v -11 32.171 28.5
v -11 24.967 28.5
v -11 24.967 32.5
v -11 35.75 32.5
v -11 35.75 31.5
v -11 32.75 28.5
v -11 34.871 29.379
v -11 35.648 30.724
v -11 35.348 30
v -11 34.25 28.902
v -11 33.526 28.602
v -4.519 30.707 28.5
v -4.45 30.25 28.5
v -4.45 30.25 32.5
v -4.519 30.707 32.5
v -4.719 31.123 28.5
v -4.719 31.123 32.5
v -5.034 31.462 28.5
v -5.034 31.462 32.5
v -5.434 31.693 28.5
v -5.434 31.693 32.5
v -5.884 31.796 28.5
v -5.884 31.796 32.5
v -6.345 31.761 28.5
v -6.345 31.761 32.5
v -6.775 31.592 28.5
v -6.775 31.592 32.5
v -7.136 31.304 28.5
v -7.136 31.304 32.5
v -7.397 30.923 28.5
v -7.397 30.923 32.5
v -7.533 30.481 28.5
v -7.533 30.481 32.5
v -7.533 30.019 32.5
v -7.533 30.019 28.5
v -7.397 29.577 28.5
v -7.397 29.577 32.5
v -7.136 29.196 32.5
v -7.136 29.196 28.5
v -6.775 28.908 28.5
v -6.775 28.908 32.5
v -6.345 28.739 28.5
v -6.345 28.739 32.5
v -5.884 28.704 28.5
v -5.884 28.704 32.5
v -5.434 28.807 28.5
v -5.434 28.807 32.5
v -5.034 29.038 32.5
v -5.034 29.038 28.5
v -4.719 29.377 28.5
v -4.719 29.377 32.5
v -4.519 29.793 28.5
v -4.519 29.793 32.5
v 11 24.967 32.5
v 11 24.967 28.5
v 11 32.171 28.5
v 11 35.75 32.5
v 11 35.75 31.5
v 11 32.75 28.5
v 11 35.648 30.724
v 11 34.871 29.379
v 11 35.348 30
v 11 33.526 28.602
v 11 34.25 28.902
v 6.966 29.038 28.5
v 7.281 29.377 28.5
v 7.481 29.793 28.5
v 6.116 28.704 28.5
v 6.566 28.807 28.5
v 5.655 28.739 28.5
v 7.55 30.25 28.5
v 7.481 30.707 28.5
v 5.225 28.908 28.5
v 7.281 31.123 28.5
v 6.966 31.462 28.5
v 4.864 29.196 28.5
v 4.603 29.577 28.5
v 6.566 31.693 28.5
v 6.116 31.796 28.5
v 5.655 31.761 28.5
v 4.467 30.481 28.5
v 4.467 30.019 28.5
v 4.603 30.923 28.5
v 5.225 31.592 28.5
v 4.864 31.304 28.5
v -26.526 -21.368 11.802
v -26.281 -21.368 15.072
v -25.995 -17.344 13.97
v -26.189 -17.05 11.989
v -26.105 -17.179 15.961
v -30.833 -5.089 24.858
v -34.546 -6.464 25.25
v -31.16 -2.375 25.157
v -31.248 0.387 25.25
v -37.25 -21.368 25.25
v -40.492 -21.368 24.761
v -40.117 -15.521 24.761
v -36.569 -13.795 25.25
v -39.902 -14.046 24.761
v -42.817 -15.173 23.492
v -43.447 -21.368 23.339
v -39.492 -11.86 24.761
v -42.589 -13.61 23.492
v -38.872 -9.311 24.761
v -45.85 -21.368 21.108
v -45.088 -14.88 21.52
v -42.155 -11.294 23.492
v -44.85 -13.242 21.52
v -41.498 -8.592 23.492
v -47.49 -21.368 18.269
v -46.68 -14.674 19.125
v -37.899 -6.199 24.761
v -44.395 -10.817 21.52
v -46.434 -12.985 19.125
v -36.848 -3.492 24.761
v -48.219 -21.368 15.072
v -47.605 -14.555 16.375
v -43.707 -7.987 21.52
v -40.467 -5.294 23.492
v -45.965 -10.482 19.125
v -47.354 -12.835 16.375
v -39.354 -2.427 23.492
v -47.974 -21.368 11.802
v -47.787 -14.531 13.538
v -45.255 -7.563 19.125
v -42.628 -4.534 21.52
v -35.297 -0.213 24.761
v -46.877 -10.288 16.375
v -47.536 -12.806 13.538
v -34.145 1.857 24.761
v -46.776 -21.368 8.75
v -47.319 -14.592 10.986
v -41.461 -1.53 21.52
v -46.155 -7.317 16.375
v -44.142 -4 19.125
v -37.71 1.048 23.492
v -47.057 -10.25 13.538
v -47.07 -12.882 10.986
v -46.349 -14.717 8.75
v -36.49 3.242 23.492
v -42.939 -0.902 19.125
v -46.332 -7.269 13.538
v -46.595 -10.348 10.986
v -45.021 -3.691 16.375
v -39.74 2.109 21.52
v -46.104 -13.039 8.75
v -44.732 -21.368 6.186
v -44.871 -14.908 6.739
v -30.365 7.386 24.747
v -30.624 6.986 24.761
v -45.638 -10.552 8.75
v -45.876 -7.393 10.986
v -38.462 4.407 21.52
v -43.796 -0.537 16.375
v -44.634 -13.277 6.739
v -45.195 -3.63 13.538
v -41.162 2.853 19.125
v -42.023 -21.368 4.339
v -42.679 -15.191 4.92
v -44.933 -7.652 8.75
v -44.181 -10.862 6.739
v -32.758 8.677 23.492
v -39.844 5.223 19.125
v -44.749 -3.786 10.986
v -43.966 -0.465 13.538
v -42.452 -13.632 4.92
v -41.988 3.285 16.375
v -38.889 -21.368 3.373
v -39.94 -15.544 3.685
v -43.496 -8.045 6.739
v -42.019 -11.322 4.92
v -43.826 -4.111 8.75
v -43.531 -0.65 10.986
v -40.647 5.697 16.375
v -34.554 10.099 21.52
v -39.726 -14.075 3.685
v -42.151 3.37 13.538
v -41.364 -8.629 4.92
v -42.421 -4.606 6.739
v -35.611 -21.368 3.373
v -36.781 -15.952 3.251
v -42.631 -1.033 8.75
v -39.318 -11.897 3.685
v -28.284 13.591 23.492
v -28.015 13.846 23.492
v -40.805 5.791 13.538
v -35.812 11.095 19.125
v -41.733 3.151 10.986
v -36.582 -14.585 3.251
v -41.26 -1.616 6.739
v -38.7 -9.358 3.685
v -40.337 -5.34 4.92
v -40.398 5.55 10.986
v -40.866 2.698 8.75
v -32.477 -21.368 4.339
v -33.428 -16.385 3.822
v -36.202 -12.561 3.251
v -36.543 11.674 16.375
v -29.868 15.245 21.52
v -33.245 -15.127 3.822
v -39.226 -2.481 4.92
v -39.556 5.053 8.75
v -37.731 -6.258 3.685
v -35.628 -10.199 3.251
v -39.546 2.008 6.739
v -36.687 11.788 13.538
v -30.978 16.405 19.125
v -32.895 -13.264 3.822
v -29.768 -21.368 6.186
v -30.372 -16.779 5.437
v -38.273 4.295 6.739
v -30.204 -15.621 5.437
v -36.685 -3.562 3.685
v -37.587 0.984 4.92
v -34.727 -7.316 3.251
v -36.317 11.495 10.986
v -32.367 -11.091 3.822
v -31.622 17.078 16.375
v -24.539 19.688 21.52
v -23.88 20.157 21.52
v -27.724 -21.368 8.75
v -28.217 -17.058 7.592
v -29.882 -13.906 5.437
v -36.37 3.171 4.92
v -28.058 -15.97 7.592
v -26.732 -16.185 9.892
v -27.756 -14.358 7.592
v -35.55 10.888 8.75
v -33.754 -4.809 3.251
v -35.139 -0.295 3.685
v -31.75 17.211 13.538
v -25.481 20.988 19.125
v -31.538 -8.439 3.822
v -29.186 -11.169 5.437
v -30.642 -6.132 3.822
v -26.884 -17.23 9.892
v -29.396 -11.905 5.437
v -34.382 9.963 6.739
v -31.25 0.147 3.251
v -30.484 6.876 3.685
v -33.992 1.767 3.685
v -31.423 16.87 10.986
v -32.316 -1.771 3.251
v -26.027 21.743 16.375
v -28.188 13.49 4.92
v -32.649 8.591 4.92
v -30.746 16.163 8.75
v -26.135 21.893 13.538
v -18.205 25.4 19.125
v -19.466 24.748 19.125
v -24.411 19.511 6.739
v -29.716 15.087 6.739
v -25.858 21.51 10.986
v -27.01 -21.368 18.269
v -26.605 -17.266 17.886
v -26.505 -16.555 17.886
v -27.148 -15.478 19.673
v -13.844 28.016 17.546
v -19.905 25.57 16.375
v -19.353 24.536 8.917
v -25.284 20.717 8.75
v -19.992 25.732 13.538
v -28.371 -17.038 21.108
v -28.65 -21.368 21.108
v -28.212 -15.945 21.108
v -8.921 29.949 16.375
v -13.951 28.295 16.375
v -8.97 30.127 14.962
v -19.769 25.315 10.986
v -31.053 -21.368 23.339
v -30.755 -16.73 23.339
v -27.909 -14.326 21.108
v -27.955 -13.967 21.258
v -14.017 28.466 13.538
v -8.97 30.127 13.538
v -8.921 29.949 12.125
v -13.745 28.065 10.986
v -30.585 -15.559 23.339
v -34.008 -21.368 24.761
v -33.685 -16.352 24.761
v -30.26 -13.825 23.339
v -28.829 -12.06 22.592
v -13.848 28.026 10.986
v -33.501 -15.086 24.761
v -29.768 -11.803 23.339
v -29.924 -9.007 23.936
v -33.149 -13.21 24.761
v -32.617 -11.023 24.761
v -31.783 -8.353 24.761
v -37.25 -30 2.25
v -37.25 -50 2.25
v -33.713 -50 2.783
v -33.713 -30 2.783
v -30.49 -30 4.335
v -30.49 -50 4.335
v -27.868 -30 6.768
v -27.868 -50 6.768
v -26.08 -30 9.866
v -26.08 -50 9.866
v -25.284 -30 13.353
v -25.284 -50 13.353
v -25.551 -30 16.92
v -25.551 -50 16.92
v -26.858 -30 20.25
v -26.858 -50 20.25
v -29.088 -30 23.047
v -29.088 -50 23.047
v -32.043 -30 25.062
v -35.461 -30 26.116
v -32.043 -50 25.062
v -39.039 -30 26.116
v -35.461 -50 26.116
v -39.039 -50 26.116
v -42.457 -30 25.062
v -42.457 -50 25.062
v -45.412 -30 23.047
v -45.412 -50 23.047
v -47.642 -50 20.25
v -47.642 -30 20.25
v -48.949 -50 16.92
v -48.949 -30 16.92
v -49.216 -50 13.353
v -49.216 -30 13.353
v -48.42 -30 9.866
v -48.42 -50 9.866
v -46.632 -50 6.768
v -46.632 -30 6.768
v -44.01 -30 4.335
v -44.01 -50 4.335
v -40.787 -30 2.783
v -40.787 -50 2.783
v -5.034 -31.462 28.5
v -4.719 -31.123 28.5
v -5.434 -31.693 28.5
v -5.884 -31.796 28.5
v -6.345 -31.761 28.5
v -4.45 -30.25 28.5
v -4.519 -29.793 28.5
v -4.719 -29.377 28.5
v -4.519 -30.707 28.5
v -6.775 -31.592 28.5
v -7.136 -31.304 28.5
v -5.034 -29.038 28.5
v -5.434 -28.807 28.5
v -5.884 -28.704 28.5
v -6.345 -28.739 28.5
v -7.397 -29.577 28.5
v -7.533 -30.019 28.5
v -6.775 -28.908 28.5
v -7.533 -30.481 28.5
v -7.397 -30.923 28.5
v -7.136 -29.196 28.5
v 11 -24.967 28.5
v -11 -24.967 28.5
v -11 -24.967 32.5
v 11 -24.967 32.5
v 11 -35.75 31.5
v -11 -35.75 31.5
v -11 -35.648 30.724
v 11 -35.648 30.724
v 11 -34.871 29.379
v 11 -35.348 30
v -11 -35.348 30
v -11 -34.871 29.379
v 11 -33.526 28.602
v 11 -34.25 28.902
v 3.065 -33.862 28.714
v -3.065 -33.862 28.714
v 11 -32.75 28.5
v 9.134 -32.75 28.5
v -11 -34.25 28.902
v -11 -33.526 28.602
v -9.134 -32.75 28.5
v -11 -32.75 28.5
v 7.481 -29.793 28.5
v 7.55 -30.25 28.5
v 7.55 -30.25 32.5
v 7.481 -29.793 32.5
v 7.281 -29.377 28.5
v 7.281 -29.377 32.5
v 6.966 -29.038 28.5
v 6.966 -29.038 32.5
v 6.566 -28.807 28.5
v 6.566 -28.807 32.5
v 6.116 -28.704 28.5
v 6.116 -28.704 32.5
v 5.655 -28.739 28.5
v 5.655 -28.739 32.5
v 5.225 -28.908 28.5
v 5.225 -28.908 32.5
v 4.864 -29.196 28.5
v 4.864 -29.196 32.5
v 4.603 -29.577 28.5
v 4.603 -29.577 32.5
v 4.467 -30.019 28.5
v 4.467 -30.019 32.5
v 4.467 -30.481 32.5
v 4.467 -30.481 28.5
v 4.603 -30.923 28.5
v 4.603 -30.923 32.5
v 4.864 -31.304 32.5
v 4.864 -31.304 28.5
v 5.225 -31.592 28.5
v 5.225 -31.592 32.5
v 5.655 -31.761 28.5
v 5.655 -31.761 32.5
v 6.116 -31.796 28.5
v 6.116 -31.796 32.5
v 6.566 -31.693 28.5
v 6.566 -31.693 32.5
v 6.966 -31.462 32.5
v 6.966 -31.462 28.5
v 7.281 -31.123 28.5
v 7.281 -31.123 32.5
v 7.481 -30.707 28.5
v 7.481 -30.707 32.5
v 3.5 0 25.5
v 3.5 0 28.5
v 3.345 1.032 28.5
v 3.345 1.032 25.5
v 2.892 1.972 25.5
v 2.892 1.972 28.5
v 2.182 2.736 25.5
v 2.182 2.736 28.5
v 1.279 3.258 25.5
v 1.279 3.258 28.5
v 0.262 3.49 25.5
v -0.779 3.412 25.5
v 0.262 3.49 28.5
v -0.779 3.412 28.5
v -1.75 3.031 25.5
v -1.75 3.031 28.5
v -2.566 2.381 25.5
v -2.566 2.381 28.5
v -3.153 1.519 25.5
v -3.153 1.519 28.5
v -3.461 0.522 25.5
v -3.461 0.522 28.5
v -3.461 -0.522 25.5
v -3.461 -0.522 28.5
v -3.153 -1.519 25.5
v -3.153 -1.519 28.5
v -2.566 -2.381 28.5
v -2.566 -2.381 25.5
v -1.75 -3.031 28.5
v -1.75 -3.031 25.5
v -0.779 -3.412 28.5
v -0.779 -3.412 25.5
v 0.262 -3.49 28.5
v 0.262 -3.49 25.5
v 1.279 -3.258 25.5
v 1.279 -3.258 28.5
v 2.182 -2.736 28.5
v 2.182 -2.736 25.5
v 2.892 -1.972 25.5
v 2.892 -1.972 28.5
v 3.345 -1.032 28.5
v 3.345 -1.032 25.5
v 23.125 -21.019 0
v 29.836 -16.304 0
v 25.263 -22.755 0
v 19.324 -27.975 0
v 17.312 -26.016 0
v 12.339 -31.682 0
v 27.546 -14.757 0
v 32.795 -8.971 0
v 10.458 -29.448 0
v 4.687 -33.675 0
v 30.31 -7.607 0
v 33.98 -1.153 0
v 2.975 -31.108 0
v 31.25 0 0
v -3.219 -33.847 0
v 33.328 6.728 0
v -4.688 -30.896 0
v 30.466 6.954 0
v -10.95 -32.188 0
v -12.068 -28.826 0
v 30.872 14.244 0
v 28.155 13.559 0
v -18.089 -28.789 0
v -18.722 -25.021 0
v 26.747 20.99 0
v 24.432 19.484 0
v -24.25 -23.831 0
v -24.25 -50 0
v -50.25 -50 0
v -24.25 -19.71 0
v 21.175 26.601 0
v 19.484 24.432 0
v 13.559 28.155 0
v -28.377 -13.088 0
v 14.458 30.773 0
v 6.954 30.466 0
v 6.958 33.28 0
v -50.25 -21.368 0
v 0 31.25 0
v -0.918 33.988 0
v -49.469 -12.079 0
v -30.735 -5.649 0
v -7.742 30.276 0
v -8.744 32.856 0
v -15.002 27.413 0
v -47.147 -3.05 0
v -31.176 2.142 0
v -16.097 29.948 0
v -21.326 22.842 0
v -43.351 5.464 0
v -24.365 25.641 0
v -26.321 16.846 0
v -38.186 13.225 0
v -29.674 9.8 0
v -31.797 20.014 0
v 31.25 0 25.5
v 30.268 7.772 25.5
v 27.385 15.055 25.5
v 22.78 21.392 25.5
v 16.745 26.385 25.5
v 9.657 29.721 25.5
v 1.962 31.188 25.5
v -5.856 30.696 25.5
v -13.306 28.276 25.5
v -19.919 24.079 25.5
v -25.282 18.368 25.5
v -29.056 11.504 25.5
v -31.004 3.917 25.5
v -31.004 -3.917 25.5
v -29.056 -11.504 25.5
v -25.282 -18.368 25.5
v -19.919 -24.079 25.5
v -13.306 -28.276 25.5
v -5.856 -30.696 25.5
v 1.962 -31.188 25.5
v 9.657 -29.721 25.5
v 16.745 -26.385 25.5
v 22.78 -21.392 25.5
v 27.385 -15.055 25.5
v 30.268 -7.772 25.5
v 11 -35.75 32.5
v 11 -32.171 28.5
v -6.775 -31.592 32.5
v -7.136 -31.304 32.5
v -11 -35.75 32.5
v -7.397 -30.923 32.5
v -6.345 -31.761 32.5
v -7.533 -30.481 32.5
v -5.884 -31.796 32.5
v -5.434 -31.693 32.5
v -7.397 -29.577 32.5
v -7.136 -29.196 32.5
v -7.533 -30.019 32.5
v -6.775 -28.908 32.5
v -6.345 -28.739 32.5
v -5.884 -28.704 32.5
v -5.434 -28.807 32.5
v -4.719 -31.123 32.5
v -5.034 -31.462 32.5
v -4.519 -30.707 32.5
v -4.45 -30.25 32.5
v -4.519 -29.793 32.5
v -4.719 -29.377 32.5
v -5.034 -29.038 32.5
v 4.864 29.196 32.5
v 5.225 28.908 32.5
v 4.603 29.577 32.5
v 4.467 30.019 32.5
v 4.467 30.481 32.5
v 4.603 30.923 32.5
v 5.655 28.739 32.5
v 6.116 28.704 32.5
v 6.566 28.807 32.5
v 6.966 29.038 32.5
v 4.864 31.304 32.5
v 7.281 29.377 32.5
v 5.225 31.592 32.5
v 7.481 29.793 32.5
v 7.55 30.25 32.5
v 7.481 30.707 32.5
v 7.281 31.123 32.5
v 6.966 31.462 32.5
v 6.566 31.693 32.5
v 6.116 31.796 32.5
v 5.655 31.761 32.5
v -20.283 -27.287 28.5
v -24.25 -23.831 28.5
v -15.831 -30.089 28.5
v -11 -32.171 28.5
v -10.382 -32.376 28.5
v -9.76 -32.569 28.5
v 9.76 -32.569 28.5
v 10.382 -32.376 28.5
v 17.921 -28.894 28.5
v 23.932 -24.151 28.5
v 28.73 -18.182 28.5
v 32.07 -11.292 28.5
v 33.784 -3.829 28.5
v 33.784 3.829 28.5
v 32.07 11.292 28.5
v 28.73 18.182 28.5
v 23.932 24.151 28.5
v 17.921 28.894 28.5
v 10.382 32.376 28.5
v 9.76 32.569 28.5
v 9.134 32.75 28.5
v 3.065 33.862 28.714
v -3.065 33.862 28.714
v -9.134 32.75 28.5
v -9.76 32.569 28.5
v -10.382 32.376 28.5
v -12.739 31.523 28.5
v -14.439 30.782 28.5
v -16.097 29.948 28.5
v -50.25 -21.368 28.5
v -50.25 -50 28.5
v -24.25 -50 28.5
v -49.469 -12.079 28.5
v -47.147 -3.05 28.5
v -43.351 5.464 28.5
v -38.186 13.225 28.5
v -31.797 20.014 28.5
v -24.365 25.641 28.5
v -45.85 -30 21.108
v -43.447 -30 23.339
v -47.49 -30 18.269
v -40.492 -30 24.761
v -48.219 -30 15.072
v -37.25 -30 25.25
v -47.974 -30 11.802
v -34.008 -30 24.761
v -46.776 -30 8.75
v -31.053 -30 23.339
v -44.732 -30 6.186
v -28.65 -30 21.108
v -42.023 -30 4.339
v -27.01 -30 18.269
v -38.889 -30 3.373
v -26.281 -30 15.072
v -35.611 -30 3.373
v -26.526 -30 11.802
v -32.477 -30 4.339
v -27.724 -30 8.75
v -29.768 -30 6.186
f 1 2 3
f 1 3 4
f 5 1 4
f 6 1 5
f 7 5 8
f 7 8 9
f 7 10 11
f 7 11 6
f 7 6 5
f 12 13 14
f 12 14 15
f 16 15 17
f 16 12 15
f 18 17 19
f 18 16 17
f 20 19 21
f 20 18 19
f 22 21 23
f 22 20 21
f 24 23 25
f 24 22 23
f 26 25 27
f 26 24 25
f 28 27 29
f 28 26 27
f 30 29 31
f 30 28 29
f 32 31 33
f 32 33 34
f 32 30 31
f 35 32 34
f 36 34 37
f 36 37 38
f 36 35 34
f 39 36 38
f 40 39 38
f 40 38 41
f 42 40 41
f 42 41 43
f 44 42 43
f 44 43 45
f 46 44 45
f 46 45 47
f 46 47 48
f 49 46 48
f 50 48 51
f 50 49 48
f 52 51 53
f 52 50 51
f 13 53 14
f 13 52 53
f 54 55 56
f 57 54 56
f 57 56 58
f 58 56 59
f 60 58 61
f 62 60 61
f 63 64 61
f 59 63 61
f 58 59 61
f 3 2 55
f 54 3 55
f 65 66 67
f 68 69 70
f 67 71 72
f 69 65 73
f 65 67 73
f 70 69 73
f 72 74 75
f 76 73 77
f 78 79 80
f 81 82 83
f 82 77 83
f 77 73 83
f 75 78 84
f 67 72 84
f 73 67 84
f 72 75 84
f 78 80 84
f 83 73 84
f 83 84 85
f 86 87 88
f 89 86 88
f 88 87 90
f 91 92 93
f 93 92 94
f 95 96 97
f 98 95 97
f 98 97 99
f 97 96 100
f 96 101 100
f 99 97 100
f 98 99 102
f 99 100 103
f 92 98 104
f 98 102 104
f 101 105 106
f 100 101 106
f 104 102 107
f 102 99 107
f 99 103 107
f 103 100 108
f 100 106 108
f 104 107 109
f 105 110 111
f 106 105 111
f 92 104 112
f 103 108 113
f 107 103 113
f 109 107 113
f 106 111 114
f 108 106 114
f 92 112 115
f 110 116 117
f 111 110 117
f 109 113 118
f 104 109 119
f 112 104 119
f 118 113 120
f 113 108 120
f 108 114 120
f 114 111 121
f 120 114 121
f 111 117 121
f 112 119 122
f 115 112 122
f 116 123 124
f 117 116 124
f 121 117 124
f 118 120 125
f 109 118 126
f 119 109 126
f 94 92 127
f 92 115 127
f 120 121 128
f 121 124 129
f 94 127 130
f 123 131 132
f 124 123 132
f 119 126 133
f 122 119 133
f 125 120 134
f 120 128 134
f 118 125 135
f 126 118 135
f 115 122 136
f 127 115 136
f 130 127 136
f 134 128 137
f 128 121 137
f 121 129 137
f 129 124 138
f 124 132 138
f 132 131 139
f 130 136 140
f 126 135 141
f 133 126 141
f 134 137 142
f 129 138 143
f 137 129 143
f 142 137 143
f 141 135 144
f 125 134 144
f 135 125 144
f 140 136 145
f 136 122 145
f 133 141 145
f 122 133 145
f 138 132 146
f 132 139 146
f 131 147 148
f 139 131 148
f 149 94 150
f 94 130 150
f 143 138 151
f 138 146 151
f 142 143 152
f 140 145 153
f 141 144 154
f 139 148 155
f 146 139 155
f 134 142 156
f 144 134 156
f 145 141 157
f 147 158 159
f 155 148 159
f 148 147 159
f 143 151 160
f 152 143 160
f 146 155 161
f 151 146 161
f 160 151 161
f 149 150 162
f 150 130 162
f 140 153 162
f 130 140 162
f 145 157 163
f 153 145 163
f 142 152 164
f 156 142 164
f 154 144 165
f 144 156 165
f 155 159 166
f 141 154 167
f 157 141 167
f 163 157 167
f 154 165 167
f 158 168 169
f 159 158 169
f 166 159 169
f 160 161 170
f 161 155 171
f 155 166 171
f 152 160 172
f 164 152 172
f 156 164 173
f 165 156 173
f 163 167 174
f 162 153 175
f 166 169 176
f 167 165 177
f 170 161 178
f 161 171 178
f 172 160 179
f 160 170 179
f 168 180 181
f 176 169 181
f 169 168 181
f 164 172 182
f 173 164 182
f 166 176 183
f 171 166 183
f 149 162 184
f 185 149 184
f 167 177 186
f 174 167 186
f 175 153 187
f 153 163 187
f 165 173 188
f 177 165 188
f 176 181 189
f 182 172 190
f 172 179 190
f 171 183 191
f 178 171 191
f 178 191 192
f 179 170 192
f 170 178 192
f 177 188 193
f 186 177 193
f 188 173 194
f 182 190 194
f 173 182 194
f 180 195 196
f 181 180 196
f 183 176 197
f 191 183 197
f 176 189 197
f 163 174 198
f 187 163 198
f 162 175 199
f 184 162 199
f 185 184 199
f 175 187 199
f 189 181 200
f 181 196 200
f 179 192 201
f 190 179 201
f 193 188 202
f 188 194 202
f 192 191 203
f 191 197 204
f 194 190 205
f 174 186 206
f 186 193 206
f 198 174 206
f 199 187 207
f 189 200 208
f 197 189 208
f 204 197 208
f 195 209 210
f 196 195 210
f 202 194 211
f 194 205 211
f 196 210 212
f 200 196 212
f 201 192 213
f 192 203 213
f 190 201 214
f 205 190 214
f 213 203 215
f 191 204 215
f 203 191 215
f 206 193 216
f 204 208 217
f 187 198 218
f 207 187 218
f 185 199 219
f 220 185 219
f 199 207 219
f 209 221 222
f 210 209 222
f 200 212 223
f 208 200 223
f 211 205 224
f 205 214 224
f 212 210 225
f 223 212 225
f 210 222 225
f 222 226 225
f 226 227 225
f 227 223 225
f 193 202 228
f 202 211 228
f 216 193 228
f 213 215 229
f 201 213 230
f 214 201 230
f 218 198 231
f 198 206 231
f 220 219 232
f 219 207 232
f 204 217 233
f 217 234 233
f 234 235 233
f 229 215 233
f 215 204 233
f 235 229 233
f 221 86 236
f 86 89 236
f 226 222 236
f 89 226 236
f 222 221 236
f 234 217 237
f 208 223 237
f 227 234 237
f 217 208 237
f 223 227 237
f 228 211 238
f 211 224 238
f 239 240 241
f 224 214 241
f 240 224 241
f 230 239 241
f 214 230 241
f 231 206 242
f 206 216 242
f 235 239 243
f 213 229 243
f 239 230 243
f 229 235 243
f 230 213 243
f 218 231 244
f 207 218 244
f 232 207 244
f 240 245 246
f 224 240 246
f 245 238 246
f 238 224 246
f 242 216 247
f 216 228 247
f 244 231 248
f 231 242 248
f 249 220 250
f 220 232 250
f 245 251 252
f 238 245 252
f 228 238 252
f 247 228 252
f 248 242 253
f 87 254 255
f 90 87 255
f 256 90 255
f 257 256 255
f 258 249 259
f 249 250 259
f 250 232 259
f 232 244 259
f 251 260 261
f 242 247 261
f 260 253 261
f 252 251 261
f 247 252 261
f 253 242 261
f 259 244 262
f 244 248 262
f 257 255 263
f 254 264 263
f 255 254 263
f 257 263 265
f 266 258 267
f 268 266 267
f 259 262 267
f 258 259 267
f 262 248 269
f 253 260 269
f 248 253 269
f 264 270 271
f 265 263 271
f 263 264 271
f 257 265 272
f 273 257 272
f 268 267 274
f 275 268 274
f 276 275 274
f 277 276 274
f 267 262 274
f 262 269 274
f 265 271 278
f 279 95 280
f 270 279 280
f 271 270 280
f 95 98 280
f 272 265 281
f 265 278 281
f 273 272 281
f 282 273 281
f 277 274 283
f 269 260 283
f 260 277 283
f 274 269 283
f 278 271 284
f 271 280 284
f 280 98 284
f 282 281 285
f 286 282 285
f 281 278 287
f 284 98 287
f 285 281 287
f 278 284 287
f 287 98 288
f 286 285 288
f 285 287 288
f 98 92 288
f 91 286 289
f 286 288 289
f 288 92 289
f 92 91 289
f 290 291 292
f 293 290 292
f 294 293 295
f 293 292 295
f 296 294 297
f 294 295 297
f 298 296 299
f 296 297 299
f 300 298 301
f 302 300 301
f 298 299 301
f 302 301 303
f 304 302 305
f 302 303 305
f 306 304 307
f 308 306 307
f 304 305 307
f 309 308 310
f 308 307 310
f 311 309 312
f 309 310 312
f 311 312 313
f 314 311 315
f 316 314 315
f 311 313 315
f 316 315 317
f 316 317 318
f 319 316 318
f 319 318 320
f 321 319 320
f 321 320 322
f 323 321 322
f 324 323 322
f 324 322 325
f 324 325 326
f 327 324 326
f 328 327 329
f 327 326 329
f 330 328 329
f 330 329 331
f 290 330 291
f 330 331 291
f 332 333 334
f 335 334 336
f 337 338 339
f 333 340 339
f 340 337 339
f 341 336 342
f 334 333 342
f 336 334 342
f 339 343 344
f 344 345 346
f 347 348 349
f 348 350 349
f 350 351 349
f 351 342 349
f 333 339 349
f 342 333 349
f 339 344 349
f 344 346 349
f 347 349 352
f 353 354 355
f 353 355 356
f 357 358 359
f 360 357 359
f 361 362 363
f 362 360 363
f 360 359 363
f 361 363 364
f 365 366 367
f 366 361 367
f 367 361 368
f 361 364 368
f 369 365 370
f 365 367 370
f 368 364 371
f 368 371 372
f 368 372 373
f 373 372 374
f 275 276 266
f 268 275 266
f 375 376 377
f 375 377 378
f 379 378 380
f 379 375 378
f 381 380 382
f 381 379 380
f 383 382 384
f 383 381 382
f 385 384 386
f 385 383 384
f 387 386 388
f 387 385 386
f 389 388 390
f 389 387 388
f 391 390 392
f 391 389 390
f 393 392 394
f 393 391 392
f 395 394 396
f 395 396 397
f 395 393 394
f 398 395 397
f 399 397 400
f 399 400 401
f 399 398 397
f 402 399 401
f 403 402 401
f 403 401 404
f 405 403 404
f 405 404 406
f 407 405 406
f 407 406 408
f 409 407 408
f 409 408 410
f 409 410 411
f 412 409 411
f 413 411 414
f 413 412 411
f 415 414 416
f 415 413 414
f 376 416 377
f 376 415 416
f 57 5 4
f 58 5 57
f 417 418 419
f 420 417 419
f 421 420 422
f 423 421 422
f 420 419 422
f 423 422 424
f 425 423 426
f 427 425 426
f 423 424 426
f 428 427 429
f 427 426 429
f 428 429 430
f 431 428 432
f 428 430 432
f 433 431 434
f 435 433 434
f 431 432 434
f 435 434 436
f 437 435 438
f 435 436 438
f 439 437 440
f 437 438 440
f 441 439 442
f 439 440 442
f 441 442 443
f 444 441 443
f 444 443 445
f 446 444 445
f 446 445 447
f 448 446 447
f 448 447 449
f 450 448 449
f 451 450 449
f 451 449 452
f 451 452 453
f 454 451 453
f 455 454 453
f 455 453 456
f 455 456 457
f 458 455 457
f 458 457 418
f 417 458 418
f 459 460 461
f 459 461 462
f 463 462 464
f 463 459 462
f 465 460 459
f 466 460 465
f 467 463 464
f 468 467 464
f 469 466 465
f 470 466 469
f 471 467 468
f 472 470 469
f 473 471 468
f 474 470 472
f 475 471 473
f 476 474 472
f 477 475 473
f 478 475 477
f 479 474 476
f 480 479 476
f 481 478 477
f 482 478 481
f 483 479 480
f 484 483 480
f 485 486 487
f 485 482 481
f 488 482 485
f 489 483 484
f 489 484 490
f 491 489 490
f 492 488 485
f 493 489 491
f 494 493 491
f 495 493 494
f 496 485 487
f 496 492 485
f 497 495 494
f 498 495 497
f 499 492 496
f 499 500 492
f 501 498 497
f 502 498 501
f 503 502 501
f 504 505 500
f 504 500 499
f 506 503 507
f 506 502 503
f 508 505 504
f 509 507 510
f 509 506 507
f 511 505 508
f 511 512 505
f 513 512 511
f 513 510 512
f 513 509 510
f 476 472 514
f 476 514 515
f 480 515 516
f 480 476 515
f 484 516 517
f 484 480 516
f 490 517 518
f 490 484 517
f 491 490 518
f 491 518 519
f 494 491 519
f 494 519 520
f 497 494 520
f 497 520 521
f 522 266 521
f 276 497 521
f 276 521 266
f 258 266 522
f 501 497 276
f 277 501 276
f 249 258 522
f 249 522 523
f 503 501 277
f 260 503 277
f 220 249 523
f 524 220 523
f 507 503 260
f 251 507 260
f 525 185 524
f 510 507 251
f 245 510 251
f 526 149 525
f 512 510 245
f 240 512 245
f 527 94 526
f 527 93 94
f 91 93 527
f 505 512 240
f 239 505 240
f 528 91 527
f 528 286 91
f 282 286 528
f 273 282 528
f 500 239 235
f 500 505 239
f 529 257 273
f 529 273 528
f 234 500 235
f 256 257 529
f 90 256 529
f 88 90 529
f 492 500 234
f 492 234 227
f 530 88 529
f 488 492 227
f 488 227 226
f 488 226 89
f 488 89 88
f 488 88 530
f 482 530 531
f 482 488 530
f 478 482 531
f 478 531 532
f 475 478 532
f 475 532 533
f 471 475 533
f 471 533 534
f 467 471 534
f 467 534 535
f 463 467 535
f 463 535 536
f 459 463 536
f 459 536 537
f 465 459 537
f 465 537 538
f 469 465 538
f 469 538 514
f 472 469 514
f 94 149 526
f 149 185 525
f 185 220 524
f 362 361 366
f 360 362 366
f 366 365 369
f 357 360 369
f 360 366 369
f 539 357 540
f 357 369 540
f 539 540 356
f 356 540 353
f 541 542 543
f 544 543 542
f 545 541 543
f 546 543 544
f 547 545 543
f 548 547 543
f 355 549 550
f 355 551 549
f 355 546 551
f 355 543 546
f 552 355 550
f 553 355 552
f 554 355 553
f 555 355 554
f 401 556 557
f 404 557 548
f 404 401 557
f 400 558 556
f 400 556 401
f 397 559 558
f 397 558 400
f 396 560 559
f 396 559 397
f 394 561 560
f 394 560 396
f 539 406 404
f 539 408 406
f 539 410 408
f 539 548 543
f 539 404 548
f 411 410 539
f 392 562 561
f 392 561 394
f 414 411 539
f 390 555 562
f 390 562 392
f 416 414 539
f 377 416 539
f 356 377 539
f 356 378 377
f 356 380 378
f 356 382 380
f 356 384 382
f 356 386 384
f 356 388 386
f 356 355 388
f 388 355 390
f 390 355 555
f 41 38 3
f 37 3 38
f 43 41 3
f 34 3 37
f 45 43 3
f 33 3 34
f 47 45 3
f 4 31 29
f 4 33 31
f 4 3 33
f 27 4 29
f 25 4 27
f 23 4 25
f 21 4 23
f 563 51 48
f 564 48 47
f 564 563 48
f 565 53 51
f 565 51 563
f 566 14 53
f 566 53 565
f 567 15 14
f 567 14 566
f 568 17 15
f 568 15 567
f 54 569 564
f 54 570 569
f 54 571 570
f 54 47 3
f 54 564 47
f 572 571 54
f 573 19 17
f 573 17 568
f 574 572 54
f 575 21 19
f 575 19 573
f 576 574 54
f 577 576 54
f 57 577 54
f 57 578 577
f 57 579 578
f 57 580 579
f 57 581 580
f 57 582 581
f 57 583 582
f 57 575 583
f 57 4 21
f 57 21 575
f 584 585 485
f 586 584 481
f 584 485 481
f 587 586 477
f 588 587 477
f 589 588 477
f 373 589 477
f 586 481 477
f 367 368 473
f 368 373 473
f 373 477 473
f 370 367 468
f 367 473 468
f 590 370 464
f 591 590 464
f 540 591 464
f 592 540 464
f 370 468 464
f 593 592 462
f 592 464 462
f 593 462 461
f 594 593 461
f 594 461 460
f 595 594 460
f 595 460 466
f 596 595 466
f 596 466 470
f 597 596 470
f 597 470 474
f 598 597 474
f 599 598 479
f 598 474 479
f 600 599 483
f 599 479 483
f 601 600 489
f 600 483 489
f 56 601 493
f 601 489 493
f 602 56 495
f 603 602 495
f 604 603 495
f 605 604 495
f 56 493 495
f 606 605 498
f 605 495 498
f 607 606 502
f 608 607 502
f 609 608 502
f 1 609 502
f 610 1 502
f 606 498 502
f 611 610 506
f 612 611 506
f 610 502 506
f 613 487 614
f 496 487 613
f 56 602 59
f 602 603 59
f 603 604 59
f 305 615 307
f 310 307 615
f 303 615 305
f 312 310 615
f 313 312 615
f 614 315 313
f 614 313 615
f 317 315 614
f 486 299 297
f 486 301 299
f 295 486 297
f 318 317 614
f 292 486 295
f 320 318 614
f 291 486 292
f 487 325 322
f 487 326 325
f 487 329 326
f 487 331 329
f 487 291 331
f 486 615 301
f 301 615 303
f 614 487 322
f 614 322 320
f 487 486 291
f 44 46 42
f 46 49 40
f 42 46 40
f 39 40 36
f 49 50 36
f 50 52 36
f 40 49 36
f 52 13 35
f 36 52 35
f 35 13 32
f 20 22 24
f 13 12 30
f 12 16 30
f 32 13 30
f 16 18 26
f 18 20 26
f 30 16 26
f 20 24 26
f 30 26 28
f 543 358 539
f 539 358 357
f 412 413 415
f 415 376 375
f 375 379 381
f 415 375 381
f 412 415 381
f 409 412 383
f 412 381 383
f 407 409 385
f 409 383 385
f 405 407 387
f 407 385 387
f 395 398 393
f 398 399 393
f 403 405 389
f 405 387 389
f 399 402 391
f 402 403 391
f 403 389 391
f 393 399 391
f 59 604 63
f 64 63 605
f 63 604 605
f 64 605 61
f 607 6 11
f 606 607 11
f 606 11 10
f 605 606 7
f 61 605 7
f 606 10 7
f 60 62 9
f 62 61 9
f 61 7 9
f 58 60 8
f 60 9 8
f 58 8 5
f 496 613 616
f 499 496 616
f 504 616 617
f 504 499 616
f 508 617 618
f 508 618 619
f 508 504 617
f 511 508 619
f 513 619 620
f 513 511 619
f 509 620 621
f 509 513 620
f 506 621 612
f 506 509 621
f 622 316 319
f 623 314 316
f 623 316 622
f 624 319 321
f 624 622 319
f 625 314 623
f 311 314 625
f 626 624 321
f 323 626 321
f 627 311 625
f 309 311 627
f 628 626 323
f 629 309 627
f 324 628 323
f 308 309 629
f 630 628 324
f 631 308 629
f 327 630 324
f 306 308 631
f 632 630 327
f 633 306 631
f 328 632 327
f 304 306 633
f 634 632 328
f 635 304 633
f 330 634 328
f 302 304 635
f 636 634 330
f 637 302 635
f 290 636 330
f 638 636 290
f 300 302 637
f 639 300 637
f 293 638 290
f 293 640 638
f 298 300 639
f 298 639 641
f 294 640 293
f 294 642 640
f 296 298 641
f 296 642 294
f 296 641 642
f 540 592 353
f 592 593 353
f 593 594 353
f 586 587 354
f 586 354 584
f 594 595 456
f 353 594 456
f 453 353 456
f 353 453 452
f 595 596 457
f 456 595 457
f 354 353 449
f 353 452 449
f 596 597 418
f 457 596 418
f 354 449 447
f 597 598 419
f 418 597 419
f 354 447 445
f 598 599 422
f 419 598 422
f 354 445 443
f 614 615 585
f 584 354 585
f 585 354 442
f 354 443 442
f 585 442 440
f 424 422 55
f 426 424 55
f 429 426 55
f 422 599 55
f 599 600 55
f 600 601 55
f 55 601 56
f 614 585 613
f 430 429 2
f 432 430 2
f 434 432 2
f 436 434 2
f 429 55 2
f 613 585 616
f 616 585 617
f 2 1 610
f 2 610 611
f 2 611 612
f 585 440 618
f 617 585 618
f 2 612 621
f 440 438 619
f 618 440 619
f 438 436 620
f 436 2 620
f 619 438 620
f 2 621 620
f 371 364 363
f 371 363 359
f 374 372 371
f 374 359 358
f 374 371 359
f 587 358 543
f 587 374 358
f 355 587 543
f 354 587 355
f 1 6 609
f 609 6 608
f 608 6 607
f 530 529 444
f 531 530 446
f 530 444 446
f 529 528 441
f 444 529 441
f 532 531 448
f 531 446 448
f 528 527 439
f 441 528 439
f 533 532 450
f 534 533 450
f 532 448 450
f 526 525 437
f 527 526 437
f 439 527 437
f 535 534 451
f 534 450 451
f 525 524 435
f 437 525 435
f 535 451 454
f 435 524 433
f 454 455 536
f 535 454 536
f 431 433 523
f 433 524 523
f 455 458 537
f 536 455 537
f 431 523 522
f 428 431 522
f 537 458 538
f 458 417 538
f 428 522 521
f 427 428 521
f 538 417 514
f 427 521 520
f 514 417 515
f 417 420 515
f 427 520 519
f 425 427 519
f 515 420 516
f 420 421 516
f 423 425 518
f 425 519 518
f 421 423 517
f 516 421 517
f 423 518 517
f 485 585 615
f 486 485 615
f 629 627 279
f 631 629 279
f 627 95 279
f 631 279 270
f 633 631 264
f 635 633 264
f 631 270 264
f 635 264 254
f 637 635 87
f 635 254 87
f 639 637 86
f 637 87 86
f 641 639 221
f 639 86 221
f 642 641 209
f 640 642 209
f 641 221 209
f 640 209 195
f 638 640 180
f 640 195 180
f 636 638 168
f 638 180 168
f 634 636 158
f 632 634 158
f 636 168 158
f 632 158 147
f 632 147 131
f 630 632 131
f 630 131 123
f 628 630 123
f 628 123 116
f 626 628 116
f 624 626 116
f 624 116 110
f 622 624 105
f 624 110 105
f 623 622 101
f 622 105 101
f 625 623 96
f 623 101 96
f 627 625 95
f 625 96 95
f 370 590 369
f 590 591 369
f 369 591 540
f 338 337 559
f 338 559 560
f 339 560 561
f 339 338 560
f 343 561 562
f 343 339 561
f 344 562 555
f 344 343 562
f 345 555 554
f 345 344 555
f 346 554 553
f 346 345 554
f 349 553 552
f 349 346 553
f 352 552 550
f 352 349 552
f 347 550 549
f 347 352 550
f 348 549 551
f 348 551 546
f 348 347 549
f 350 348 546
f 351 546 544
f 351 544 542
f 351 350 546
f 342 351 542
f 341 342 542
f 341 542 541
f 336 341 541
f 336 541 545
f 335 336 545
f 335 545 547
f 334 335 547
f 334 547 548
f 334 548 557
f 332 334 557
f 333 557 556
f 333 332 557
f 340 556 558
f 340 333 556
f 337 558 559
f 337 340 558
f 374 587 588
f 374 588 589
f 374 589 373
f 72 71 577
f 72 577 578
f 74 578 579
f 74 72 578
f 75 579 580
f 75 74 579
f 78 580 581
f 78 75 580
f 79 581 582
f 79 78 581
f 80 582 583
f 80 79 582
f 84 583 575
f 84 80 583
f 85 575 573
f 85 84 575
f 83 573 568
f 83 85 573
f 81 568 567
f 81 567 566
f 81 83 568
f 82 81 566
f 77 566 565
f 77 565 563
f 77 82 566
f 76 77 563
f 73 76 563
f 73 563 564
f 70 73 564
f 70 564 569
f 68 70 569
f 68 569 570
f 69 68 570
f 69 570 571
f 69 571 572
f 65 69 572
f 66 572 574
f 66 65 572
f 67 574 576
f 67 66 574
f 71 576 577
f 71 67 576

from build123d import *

# Parameters (mm, degrees)
SKETCH1_R            = 34
SKETCH1_R_2          = 31.25
BOSS_EXTRUDE1_DEPTH  = 25.5
SKETCH2_R            = 34
BOSS_EXTRUDE2_DEPTH  = 3
SKETCH5_R            = 3.5
CUT_EXTRUDE3_DEPTH   = 51
BOSS_EXTRUDE9_START  = 25.5
BOSS_EXTRUDE9_DEPTH  = 28.5
CUT_SWEEP6_PROFILE_R = 11
SKETCH219_R          = 12
CUT_EXTRUDE10_DEPTH  = 20
SKETCH227_W          = 22
SKETCH227_H          = 10.782706647
SKETCH227_R          = 1.55
BOSS_EXTRUDE11_DEPTH = 4
FILLET1_R            = 3
FILLET2_R            = 3


with BuildPart() as part:
    # Sketch1 → Boss-Extrude1 (new body)
    with BuildSketch(Plane.XY):
        Circle(SKETCH1_R)
        Circle(SKETCH1_R_2, mode=Mode.SUBTRACT)
    extrude(amount=BOSS_EXTRUDE1_DEPTH)

    # Sketch2 → Boss-Extrude2 (add)
    with BuildSketch(Plane.XY.offset(25.5)):
        Circle(SKETCH2_R)
    extrude(amount=BOSS_EXTRUDE2_DEPTH)

    # Sketch5 → Cut-Extrude3 (cut)
    with BuildSketch(Plane.XY.offset(28.5)):
        Circle(SKETCH5_R)
    extrude(amount=-CUT_EXTRUDE3_DEPTH, mode=Mode.SUBTRACT)

    # Sketch3 → Boss-Extrude9 (add)
    with BuildSketch(Plane(origin=(0, 0, 25.5), x_dir=(-1, 0, 0), z_dir=(0, 0, -1)).offset(BOSS_EXTRUDE9_START)):
        with BuildLine():
            Line((24.25, -50), (50.25, -50))
            Line((50.25, -50), (50.25, -21.368098989))
            ThreePointArc((50.25, -21.368098989), (35.814519651, 16.017355688), (0, 34))
            Line((0, 34), (0, 31.25))
            ThreePointArc((0, 31.25), (28.21801379, 13.427814332), (24.25, -19.710403344))
            Line((24.25, -19.710403344), (24.25, -50))
        make_face()
    extrude(amount=-BOSS_EXTRUDE9_DEPTH)

    # Cut-Sweep6: sweep along a path in Sketch28
    with BuildLine(Plane(origin=(0, 0, 14.25), x_dir=(-1, 0, 0), z_dir=(0, 0, -1))) as cut_sweep6_path:
        Line((37.25, -50), (37.25, -21.368098989))
        ThreePointArc((37.25, -21.368098989), (28.563956157, 4.353039323), (6.0625, 19.54214017))
    # Cut-Sweep6 profile (on start of the path) → Cut-Sweep6 (sweep, cut)
    with BuildSketch(Plane(origin=(-37.25, -50, 14.25), x_dir=(0, 0, 1), z_dir=(0, 1, 0))):
        Circle(CUT_SWEEP6_PROFILE_R)
    sweep(path=cut_sweep6_path.line, mode=Mode.SUBTRACT)

    # Sketch219 → Cut-Extrude10 (cut)
    with BuildSketch(Plane.XZ.offset(50)):
        with Locations(Location((-37.25, 14.25, 0), (0, 0, 270))):
            Circle(SKETCH219_R)
    extrude(amount=-CUT_EXTRUDE10_DEPTH, mode=Mode.SUBTRACT)

    # Sketch227 → Boss-Extrude11 (add)
    # profile 1 of 2: a face of its own
    with BuildSketch(Plane.XY.offset(28.5)):
        with Locations((0, 30.358646677)):
            Rectangle(SKETCH227_W, SKETCH227_H)
        with Locations((-6, 30.25)):
            Circle(SKETCH227_R, mode=Mode.SUBTRACT)
        with Locations((6, 30.25)):
            Circle(SKETCH227_R, mode=Mode.SUBTRACT)
    # profile 2 of 2: a face of its own
    with BuildSketch(Plane.XY.offset(28.5)):
        with Locations((0, -30.358646677)):
            Rectangle(SKETCH227_W, SKETCH227_H)
        with Locations((-6, -30.25)):
            Circle(SKETCH227_R, mode=Mode.SUBTRACT)
        with Locations((6, -30.25)):
            Circle(SKETCH227_R, mode=Mode.SUBTRACT)
    extrude(amount=BOSS_EXTRUDE11_DEPTH)

    # Fillet1
    # the kernel refuses this fillet: 3 mm, written as the material it takes off along each edge
    with BuildSketch(Plane(origin=(-18.5, 35.75, 28.5), x_dir=(0, -1, 0), z_dir=(1, 0, 0))) as fillet1_piece_1_section:
        with BuildLine():
            CenterArc((FILLET1_R, -FILLET1_R), FILLET1_R, 90, 90)
            Line((0, -FILLET1_R), (0, 0))
            Line((0, 0), (FILLET1_R, 0))
        make_face()
    fillet1_piece_1 = extrude(amount=37, mode=Mode.PRIVATE)
    fillet1_piece_1 = fillet1_piece_1 - Plane(origin=(0, 0, 29.19390081), x_dir=(1, 0, 0), z_dir=(0, 0, -1)) * Cylinder(34, 86, mode=Mode.PRIVATE)
    add(fillet1_piece_1, mode=Mode.SUBTRACT)

    # Fillet2
    # the kernel refuses this fillet: 3 mm, written as the material it takes off along each edge
    with BuildSketch(Plane(origin=(-18.5, -35.75, 28.5), x_dir=(0, 1, 0), z_dir=(1, 0, 0))) as fillet2_piece_1_section:
        with BuildLine():
            CenterArc((FILLET2_R, FILLET2_R), FILLET2_R, 180, 90)
            Line((0, FILLET2_R), (0, 0))
            Line((0, 0), (FILLET2_R, 0))
        make_face()
    fillet2_piece_1 = extrude(amount=37, mode=Mode.PRIVATE)
    fillet2_piece_1 = fillet2_piece_1 - Plane(origin=(0, 0, 29.19390081), x_dir=(1, 0, 0), z_dir=(0, 0, -1)) * Cylinder(34, 86, mode=Mode.PRIVATE)
    add(fillet2_piece_1, mode=Mode.SUBTRACT)


solid = part.part
